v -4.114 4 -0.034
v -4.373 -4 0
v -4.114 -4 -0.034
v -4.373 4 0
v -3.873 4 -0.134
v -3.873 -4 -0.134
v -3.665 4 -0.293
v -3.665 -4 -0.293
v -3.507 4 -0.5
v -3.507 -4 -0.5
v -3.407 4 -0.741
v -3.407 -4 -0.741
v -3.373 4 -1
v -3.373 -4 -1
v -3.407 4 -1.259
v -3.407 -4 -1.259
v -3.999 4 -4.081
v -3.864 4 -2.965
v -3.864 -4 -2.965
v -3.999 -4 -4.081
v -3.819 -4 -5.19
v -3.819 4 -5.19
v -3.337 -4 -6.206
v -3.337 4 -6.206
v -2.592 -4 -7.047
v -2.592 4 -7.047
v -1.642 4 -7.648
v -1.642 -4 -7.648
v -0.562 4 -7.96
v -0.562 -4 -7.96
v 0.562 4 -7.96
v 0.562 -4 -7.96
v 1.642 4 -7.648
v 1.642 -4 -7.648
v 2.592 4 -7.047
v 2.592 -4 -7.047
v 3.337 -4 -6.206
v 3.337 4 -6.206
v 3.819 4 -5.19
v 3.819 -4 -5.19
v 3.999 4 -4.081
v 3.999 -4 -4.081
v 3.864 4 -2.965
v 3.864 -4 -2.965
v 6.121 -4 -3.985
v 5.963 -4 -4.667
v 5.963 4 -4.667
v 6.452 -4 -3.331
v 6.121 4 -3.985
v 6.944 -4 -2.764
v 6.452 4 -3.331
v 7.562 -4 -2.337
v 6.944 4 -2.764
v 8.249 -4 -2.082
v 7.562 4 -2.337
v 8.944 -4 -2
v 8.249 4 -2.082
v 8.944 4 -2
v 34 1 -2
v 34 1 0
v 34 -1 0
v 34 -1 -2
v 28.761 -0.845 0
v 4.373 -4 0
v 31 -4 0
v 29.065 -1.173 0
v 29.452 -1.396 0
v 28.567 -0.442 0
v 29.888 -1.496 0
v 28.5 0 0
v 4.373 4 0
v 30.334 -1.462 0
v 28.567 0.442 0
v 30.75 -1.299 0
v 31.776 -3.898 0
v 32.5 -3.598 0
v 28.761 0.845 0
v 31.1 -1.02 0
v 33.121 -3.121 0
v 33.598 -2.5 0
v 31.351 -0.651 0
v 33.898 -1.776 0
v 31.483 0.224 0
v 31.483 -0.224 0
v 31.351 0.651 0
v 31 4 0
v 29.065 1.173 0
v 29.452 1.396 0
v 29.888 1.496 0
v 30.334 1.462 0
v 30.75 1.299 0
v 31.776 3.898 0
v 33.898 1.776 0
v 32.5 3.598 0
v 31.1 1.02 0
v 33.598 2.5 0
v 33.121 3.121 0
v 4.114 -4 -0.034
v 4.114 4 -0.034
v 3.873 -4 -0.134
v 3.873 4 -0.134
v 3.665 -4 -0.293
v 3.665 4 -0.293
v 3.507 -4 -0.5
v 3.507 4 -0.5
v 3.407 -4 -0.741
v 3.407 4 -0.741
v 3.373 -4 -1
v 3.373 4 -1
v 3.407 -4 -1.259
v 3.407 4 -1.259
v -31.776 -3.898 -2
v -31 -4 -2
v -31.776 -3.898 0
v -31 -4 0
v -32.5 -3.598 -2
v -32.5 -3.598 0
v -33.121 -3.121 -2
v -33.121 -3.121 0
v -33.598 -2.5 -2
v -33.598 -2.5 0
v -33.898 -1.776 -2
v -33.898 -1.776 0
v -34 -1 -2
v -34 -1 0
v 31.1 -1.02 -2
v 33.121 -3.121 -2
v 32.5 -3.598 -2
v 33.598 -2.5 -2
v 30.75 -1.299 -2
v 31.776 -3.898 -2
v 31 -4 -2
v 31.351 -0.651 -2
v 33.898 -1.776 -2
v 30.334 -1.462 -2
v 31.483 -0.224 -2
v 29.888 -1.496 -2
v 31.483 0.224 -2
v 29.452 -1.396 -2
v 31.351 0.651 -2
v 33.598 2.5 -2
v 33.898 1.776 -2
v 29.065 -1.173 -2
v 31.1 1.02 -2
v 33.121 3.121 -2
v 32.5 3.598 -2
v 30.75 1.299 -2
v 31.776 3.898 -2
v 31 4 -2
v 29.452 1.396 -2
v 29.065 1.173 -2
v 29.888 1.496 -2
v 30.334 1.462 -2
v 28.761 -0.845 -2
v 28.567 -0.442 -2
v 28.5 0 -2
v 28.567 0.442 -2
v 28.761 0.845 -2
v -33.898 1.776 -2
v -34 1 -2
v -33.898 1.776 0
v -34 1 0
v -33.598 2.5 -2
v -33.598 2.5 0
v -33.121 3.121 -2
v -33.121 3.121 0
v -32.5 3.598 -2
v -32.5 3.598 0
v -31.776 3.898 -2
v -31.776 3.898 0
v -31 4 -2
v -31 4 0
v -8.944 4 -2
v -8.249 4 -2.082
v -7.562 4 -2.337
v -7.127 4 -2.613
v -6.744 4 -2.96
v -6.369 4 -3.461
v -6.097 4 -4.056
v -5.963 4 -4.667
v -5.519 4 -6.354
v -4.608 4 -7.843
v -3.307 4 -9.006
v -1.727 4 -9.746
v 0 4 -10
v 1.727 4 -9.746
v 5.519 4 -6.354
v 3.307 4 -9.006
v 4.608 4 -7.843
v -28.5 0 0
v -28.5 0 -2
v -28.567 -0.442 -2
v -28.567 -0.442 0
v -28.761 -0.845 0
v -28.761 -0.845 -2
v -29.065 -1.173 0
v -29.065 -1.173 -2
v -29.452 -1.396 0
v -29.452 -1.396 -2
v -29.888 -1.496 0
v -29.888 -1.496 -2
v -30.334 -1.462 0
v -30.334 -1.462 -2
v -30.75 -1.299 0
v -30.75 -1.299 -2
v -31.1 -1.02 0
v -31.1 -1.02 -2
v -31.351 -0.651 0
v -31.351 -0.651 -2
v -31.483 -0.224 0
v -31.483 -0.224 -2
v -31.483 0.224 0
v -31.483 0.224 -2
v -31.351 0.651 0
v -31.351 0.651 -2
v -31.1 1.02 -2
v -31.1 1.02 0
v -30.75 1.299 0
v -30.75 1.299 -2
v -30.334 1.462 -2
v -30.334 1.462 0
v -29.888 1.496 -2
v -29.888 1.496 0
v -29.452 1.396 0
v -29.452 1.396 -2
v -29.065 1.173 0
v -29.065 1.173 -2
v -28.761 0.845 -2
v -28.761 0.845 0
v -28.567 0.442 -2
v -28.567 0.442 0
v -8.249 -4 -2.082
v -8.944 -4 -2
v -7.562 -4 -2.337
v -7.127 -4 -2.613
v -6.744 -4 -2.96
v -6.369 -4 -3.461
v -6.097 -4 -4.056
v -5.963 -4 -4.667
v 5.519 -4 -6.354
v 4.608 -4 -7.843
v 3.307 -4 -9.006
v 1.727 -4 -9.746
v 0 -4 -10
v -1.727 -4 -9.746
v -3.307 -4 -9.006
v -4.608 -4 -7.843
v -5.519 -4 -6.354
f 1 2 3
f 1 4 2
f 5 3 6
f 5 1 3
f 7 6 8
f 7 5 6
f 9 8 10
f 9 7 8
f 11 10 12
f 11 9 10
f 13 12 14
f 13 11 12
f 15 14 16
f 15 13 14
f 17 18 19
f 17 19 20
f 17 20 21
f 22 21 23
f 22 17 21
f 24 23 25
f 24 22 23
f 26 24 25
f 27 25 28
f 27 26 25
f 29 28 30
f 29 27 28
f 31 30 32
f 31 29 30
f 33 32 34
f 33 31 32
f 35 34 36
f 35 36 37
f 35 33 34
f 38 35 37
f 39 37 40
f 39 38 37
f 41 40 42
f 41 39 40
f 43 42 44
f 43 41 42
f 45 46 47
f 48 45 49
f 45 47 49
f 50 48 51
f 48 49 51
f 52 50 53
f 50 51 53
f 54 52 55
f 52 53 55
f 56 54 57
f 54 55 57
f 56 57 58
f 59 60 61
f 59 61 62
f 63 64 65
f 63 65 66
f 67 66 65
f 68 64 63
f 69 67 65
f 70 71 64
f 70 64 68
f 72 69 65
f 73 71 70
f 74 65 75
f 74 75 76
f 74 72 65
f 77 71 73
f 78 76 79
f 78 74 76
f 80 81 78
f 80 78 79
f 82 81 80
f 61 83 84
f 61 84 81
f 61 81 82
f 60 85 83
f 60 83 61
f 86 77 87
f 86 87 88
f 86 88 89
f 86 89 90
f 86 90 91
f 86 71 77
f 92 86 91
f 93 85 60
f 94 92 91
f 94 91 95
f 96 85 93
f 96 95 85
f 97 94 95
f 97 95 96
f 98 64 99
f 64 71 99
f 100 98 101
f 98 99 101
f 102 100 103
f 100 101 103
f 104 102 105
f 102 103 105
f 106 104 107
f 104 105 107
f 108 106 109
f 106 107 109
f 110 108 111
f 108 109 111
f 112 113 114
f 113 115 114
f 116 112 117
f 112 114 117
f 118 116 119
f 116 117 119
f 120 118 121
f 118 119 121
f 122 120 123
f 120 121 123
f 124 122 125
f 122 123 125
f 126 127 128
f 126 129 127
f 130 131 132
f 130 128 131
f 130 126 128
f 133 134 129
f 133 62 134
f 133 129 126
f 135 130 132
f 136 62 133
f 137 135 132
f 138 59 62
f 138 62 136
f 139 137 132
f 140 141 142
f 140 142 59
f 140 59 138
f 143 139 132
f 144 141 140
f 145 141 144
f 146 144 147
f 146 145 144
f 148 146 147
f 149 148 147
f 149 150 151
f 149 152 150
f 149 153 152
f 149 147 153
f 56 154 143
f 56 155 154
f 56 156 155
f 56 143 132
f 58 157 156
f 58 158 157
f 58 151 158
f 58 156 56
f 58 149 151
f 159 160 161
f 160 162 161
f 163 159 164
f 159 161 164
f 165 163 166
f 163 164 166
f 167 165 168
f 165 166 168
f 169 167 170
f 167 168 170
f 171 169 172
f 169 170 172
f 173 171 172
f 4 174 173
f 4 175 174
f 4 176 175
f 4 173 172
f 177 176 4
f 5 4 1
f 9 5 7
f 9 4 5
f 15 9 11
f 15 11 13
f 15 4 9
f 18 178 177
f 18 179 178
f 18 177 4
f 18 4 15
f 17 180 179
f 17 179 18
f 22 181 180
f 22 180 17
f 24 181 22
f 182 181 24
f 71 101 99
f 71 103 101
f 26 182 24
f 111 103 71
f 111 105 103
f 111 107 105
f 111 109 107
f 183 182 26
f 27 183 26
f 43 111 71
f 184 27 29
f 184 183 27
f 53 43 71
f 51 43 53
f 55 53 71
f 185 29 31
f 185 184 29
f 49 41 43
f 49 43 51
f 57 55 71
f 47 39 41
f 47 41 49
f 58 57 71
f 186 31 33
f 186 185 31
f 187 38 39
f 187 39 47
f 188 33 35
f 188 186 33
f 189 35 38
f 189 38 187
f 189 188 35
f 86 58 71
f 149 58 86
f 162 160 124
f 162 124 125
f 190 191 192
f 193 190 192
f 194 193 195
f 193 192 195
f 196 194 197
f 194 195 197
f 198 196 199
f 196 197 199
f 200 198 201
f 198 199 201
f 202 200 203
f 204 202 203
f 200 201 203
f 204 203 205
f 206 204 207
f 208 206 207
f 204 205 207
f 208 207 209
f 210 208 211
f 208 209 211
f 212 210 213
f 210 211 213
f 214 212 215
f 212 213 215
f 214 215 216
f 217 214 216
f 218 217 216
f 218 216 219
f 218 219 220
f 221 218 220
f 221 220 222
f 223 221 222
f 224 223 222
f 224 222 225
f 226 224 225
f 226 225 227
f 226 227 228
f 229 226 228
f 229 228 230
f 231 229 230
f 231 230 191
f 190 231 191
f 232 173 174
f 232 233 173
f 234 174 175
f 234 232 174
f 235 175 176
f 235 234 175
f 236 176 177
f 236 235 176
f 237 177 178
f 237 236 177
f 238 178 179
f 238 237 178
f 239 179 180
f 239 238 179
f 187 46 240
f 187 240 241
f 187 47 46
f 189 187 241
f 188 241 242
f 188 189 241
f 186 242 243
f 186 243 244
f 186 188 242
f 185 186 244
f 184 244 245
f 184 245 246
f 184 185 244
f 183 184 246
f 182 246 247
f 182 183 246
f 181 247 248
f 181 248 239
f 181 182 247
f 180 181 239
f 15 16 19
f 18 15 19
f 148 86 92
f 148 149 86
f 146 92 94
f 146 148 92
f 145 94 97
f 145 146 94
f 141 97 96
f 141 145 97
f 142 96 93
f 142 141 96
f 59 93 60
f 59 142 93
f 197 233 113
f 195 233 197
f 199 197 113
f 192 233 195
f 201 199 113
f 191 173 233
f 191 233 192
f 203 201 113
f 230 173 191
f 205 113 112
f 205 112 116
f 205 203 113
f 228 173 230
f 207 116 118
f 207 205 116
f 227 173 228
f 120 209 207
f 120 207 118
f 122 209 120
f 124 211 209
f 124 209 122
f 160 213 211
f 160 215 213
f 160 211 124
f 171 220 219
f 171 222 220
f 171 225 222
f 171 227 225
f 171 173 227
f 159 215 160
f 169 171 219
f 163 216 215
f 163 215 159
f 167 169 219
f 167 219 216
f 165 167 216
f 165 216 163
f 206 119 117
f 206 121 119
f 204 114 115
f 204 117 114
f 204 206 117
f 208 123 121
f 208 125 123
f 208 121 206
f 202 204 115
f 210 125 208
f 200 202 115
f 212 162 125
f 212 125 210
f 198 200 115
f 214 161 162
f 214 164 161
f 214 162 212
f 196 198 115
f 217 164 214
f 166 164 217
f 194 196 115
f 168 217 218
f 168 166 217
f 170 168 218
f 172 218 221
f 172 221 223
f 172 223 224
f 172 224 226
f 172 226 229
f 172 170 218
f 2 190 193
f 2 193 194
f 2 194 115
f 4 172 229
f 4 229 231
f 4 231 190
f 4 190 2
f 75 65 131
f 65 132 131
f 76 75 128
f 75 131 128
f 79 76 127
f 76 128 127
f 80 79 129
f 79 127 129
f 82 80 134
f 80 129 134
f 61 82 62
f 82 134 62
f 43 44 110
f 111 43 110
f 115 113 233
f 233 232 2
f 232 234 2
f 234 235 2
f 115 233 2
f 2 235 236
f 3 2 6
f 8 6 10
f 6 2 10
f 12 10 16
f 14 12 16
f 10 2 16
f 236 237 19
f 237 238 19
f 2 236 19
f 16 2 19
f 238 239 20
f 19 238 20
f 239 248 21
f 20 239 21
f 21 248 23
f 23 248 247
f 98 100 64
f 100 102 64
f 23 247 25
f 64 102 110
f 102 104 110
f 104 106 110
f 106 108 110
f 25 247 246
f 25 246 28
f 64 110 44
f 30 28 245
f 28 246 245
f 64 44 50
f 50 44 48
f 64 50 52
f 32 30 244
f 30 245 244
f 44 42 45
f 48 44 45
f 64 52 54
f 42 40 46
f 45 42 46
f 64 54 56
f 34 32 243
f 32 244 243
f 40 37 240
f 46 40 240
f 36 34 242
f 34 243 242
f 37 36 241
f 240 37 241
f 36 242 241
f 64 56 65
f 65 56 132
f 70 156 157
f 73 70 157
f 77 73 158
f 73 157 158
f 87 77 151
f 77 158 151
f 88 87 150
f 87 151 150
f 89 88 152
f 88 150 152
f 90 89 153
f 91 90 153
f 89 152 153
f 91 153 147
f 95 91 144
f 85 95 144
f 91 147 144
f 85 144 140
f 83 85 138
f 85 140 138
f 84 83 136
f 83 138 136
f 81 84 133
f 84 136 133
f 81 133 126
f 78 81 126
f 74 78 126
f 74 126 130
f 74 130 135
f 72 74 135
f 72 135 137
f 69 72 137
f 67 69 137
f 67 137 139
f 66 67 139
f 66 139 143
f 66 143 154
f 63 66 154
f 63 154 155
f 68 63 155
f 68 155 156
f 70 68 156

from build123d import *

# Parameters (mm, degrees)
EXTRU_MINCE1_DEPTH      = 4
CONG_1_R                = 1
CONG_2_R                = 3
ESQUISSE2_R             = 1.5
ENL_V_MAT_EXTRU_1_DEPTH = 36.156791793


with BuildPart() as part:
    # Esquisse1 → Extru.-Mince1 (new, symmetric)
    with BuildSketch(Plane(origin=(0, 0, 0), x_dir=(1, 0, 0), z_dir=(0, 1, 0))):
        with BuildLine():
            Line((-34, 0), (-3.069307952, 0))
            Line((-3.069307952, 0), (-3.863703305, 2.96472382))
            ThreePointArc((-3.863703305, 2.96472382), (0, 8), (3.863703305, 2.96472382))
            Line((3.863703305, 2.96472382), (3.069307952, 0))
            Line((3.069307952, 0), (34, 0))
            Line((34, 0), (34, 2))
            Line((34, 2), (5.675758698, 2))
            Line((5.675758698, 2), (5.795554958, 2.447085729))
            ThreePointArc((5.795554958, 2.447085729), (0, 10), (-5.795554958, 2.447085729))
            Line((-5.795554958, 2.447085729), (-5.675758698, 2))
            Line((-5.675758698, 2), (-34, 2))
            Line((-34, 2), (-34, 0))
        make_face()
    extrude(amount=EXTRU_MINCE1_DEPTH, both=True)

    # Congé1
    cong_1_edges = [part.edges().sort_by_distance(p)[0] for p in [
        (3.069307952, 0, 0),
        (-3.069307952, 0, 0),
    ]]
    fillet(cong_1_edges, radius=CONG_1_R)

    # Congé2
    cong_2_edges = [part.edges().sort_by_distance(p)[0] for p in [
        (34, -4, -1),
        (34, 4, -1),
        (5.675758698, 0, -2),
        (-34, -4, -1),
        (-34, 4, -1),
        (-5.675758698, 0, -2),
    ]]
    fillet(cong_2_edges, radius=CONG_2_R)

    # Esquisse2 → Enlèv. mat.-Extru.1 (cut, through all)
    with BuildSketch(Plane(origin=(0, 0, -2), x_dir=(-1, 0, 0), z_dir=(0, 0, -1))):
        with Locations((-30, 0)):
            Circle(ESQUISSE2_R)
        with Locations(Location((30, 0, 0), (0, 0, 180))):
            Circle(ESQUISSE2_R)
    extrude(amount=-ENL_V_MAT_EXTRU_1_DEPTH, mode=Mode.SUBTRACT)


solid = part.part
